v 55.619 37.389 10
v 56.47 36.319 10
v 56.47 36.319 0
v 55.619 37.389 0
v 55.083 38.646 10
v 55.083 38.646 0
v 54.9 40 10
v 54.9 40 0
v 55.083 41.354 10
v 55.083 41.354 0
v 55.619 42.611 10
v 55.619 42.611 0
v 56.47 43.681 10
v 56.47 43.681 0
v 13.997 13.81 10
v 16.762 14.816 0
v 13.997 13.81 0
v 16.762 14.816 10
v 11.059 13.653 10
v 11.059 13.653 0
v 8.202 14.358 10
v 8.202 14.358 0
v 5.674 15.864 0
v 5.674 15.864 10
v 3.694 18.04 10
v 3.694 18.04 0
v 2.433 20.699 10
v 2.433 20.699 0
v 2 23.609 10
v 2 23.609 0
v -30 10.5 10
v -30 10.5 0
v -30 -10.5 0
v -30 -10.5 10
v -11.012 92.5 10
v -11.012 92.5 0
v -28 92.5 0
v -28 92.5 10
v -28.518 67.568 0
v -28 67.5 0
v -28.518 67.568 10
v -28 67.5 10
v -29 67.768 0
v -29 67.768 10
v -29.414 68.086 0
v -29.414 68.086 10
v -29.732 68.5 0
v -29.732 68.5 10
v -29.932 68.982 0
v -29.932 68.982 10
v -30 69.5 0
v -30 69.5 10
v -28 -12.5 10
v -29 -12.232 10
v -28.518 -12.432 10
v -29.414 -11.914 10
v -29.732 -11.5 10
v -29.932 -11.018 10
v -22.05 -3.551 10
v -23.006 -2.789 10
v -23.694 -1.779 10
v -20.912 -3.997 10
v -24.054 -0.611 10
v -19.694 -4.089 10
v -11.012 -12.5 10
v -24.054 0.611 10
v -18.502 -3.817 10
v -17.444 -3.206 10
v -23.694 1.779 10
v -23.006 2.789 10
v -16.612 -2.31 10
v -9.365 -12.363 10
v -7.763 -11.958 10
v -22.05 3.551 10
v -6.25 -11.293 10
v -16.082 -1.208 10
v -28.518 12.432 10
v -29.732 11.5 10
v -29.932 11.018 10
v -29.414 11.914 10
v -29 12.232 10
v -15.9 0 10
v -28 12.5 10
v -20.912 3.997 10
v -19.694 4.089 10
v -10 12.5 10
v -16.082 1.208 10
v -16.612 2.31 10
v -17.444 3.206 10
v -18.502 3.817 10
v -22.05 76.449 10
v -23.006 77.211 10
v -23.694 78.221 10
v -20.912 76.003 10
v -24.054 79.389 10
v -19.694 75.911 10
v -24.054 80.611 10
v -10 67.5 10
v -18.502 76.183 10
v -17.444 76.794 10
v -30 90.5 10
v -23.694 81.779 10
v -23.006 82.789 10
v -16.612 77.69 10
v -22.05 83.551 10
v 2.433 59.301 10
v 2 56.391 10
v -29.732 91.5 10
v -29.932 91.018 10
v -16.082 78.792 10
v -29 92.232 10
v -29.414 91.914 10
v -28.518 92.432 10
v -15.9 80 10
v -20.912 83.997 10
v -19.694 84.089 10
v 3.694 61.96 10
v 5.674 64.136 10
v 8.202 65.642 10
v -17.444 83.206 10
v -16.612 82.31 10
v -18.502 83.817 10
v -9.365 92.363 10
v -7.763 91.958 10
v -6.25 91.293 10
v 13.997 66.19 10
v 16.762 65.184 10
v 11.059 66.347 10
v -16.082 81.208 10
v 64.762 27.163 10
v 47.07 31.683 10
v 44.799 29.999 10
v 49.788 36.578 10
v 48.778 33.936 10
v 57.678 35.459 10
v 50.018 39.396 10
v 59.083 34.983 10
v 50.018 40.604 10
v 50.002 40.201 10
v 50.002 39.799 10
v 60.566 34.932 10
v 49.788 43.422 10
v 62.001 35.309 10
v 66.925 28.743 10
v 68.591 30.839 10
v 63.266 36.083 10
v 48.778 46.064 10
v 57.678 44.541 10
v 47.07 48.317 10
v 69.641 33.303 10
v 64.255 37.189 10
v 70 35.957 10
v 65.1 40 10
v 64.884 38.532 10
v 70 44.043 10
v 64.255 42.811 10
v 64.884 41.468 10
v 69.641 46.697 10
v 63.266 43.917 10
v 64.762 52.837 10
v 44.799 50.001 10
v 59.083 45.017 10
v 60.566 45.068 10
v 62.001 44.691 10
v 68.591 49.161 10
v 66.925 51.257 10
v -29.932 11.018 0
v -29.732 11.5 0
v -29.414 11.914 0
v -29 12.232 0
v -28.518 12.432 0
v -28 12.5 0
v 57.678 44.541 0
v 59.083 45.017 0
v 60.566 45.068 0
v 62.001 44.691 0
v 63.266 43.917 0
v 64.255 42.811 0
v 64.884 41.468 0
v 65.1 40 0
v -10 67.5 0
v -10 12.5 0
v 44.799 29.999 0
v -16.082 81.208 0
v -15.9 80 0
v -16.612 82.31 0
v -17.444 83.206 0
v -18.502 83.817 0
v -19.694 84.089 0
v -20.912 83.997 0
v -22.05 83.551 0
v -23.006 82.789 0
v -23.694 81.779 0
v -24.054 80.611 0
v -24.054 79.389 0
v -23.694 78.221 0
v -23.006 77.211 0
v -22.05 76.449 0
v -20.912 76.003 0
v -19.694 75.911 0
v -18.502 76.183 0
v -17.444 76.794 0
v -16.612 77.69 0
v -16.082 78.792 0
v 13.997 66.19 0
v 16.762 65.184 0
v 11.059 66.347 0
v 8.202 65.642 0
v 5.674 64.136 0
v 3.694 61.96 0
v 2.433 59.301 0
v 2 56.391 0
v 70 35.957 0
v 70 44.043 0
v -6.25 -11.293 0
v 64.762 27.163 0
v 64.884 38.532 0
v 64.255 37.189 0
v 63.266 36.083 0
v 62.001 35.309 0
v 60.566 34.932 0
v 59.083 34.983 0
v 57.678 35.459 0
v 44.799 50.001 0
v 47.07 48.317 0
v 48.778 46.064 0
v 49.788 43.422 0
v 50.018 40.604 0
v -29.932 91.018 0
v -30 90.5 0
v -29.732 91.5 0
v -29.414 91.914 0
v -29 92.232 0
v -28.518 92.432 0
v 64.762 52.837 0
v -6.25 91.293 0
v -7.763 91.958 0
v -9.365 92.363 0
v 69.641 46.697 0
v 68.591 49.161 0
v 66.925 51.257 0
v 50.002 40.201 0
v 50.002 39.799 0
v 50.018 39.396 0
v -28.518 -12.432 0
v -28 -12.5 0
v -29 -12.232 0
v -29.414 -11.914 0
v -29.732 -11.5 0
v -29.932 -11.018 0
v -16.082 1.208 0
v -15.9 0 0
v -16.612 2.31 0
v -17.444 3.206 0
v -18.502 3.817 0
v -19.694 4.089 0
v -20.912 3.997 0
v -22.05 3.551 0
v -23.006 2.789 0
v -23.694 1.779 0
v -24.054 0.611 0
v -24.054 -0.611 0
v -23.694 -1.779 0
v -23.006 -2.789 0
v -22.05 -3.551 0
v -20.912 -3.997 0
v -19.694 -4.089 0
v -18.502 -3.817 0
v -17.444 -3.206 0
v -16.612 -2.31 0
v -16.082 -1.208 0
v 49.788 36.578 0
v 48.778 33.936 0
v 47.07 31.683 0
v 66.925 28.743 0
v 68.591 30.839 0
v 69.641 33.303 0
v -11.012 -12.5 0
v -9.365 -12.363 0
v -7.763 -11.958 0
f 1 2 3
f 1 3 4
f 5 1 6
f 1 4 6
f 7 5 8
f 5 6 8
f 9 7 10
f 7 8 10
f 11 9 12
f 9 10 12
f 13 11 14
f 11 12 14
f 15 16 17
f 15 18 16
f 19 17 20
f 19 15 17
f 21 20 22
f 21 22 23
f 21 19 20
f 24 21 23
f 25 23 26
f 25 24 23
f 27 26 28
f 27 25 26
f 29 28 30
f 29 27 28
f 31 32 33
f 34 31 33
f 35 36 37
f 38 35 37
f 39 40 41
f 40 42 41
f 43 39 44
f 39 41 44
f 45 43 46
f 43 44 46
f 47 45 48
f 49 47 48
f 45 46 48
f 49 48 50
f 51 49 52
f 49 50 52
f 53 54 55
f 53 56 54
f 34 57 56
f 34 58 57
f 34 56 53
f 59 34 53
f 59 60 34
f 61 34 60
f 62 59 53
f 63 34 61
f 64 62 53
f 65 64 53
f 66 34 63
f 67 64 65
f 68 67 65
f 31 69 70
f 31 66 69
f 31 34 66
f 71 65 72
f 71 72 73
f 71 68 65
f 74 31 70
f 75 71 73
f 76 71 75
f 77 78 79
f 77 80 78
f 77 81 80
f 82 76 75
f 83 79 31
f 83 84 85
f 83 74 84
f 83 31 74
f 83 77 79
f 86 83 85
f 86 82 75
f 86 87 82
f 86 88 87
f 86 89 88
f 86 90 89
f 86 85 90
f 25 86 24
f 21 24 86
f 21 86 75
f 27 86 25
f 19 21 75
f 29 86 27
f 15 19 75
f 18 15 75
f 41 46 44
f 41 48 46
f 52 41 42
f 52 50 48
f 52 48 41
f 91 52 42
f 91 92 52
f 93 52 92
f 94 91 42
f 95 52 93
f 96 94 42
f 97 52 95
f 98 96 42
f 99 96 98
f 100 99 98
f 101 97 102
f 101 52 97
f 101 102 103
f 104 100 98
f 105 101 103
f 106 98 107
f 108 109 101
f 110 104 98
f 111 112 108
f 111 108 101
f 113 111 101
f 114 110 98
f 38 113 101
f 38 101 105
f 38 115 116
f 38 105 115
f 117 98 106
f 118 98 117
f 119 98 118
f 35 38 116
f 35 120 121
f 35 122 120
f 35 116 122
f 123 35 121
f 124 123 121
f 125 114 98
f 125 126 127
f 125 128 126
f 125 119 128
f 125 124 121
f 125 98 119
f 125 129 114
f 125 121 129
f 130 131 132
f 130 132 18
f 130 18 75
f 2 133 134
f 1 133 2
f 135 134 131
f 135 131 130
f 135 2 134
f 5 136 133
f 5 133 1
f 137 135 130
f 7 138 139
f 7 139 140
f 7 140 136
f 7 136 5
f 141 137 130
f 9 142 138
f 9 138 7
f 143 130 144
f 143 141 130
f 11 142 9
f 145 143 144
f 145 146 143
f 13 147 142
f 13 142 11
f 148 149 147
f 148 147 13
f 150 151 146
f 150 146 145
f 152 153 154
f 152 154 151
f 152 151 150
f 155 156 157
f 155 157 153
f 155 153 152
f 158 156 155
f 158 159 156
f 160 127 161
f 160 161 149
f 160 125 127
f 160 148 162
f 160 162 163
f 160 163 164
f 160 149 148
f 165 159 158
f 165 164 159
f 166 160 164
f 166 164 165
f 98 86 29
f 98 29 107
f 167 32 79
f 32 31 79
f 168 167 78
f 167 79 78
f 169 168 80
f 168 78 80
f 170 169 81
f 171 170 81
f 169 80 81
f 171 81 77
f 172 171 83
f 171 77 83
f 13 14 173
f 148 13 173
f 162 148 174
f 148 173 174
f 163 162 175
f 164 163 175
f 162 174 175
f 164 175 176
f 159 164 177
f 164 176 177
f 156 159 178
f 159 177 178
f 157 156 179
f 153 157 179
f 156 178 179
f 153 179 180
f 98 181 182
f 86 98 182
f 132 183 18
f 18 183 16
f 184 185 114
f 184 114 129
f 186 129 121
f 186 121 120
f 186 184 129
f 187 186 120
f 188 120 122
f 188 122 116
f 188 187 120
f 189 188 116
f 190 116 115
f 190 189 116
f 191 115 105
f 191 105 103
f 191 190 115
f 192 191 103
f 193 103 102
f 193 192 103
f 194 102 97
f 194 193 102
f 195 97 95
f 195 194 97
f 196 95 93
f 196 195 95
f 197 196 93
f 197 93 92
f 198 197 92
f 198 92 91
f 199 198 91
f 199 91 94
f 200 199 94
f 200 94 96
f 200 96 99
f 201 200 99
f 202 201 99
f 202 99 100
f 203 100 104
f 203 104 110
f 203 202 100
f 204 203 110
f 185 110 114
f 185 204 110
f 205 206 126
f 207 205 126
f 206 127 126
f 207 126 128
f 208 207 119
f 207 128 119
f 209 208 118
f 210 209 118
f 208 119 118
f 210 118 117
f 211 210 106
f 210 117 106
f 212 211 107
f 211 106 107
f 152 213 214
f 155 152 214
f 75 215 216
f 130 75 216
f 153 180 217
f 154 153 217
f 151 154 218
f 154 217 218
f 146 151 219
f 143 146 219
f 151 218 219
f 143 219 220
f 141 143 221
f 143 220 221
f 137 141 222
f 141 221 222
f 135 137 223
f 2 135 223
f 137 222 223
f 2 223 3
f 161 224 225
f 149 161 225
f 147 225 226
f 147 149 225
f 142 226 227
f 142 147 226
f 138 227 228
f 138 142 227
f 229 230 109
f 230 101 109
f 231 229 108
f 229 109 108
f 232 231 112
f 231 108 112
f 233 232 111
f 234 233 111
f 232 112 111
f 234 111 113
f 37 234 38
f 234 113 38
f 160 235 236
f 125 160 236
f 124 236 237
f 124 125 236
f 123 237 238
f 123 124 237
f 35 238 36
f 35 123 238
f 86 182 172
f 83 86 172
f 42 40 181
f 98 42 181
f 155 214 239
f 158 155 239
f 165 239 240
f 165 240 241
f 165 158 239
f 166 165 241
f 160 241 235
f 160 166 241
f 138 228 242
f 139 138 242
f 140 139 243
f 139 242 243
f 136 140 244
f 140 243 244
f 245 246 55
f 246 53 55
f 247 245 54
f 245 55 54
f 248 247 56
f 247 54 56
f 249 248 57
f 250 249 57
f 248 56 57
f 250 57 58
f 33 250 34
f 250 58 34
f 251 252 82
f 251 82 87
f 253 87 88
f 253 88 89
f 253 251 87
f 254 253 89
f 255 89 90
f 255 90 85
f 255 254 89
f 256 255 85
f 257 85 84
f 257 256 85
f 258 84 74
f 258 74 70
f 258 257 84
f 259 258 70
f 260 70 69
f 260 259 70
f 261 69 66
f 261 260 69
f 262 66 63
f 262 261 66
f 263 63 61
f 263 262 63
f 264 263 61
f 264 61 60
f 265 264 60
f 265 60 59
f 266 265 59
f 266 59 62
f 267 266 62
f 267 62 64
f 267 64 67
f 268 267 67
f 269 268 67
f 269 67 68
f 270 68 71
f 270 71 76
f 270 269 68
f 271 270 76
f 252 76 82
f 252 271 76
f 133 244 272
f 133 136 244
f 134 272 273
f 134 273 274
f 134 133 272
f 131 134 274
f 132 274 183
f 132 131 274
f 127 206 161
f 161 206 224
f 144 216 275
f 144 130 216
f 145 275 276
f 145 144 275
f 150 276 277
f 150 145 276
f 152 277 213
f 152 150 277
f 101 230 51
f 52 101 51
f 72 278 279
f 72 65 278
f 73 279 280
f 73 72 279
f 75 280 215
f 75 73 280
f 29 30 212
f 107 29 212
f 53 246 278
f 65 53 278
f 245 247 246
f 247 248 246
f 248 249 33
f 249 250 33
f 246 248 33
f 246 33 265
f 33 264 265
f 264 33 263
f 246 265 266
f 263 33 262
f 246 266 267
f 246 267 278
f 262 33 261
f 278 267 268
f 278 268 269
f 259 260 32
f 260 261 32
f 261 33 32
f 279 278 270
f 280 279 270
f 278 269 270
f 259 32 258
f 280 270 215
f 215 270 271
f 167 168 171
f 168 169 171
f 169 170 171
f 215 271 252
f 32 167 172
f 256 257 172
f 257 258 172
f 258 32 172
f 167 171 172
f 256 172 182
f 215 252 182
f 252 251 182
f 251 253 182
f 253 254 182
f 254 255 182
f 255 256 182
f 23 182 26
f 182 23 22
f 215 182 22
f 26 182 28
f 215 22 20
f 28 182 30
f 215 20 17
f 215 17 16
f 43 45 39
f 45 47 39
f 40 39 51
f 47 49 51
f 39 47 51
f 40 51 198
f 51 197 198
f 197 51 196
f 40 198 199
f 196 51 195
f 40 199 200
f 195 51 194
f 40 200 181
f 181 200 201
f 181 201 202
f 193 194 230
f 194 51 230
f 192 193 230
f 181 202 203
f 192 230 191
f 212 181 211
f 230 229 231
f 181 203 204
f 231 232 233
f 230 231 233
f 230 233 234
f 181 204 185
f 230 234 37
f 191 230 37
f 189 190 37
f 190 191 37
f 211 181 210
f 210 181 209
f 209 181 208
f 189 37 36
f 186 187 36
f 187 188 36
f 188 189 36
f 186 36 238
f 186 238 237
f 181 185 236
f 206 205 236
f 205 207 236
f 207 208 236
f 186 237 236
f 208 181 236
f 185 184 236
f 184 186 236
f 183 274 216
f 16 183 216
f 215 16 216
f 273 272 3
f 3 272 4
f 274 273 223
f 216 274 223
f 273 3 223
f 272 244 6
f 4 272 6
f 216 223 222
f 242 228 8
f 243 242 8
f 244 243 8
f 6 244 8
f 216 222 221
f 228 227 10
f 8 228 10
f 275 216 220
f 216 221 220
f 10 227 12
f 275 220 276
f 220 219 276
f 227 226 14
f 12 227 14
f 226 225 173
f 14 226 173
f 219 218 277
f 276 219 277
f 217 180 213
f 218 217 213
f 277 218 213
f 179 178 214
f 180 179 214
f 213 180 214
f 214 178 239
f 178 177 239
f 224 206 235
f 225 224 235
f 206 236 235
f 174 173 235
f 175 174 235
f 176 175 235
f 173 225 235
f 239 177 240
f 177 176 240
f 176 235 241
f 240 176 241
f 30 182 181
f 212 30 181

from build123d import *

# Parameters (mm, degrees)
F0_R     = 4.1
F1_DEPTH = 10
F2_R     = 10
F3_R     = 2


with BuildPart() as f1:
    # F0 (on Top) → F1 (new body)
    with BuildSketch(Plane.XY):
        Polygon((70, 30), (70, 40), (70, 50), (-8.4782754802, 92.5), (-30, 92.5), (-30, 67.5), (-10, 67.5), (-10, 12.5), (-30, 12.5), (-30, -12.5), (-8.4782754802, -12.5), align=None)
        with Locations((-20, 0)):
            Circle(F0_R, mode=Mode.SUBTRACT)
        with Locations((-20, 80)):
            Circle(F0_R, mode=Mode.SUBTRACT)
        with BuildLine():
            Line((2, 73.1787940384), (52.0543567222, 46.0717998075))
            ThreePointArc((52.0543567222, 46.0717998075), (63.2049623416, 49.472497896), (70, 40))
            ThreePointArc((70, 40), (63.2049623416, 30.527502104), (52.0543567222, 33.9282001925))
            Line((52.0543567222, 33.9282001925), (2, 6.8212059616))
            Line((2, 6.8212059616), (2, 73.1787940384))
        make_face(mode=Mode.SUBTRACT)
        with BuildLine():
            ThreePointArc((56.4697287247, 43.6806500408), (62.0007019388, 44.6911823405), (65.1, 40))
            ThreePointArc((65.1, 40), (62.0007019388, 35.3088176595), (56.4697287247, 36.3193499592))
            Line((56.4697287247, 36.3193499592), (52.0543567222, 33.9282001925))
            ThreePointArc((52.0543567222, 33.9282001925), (63.2049623416, 30.527502104), (70, 40))
            ThreePointArc((70, 40), (63.2049623416, 49.472497896), (52.0543567222, 46.0717998075))
            Line((52.0543567222, 46.0717998075), (56.4697287247, 43.6806500408))
        make_face()
        with BuildLine():
            ThreePointArc((56.4697287247, 36.3193499592), (54.9, 40), (56.4697287247, 43.6806500408))
            Line((56.4697287247, 43.6806500408), (52.0543567222, 46.0717998075))
            ThreePointArc((52.0543567222, 46.0717998075), (50, 40), (52.0543567222, 33.9282001925))
            Line((52.0543567222, 33.9282001925), (56.4697287247, 36.3193499592))
        make_face()
    extrude(amount=F1_DEPTH)

    # F2
    f2_edges = [f1.edges().sort_by_distance(p)[0] for p in [
        (-8.478275, 92.5, 5),
        (-8.478275, -12.5, 5),
        (70, 30, 5),
        (70, 50, 5),
        (52.054357, 46.0718, 5),
        (52.054357, 33.9282, 5),
        (2, 6.821206, 5),
        (2, 73.178794, 5),
    ]]
    fillet(f2_edges, radius=F2_R)

    # F3
    f3_edges = [f1.edges().sort_by_distance(p)[0] for p in [
        (-30, 92.5, 5),
        (-30, 67.5, 5),
        (-30, 12.5, 5),
        (-30, -12.5, 5),
    ]]
    fillet(f3_edges, radius=F3_R)


solid = f1.part
